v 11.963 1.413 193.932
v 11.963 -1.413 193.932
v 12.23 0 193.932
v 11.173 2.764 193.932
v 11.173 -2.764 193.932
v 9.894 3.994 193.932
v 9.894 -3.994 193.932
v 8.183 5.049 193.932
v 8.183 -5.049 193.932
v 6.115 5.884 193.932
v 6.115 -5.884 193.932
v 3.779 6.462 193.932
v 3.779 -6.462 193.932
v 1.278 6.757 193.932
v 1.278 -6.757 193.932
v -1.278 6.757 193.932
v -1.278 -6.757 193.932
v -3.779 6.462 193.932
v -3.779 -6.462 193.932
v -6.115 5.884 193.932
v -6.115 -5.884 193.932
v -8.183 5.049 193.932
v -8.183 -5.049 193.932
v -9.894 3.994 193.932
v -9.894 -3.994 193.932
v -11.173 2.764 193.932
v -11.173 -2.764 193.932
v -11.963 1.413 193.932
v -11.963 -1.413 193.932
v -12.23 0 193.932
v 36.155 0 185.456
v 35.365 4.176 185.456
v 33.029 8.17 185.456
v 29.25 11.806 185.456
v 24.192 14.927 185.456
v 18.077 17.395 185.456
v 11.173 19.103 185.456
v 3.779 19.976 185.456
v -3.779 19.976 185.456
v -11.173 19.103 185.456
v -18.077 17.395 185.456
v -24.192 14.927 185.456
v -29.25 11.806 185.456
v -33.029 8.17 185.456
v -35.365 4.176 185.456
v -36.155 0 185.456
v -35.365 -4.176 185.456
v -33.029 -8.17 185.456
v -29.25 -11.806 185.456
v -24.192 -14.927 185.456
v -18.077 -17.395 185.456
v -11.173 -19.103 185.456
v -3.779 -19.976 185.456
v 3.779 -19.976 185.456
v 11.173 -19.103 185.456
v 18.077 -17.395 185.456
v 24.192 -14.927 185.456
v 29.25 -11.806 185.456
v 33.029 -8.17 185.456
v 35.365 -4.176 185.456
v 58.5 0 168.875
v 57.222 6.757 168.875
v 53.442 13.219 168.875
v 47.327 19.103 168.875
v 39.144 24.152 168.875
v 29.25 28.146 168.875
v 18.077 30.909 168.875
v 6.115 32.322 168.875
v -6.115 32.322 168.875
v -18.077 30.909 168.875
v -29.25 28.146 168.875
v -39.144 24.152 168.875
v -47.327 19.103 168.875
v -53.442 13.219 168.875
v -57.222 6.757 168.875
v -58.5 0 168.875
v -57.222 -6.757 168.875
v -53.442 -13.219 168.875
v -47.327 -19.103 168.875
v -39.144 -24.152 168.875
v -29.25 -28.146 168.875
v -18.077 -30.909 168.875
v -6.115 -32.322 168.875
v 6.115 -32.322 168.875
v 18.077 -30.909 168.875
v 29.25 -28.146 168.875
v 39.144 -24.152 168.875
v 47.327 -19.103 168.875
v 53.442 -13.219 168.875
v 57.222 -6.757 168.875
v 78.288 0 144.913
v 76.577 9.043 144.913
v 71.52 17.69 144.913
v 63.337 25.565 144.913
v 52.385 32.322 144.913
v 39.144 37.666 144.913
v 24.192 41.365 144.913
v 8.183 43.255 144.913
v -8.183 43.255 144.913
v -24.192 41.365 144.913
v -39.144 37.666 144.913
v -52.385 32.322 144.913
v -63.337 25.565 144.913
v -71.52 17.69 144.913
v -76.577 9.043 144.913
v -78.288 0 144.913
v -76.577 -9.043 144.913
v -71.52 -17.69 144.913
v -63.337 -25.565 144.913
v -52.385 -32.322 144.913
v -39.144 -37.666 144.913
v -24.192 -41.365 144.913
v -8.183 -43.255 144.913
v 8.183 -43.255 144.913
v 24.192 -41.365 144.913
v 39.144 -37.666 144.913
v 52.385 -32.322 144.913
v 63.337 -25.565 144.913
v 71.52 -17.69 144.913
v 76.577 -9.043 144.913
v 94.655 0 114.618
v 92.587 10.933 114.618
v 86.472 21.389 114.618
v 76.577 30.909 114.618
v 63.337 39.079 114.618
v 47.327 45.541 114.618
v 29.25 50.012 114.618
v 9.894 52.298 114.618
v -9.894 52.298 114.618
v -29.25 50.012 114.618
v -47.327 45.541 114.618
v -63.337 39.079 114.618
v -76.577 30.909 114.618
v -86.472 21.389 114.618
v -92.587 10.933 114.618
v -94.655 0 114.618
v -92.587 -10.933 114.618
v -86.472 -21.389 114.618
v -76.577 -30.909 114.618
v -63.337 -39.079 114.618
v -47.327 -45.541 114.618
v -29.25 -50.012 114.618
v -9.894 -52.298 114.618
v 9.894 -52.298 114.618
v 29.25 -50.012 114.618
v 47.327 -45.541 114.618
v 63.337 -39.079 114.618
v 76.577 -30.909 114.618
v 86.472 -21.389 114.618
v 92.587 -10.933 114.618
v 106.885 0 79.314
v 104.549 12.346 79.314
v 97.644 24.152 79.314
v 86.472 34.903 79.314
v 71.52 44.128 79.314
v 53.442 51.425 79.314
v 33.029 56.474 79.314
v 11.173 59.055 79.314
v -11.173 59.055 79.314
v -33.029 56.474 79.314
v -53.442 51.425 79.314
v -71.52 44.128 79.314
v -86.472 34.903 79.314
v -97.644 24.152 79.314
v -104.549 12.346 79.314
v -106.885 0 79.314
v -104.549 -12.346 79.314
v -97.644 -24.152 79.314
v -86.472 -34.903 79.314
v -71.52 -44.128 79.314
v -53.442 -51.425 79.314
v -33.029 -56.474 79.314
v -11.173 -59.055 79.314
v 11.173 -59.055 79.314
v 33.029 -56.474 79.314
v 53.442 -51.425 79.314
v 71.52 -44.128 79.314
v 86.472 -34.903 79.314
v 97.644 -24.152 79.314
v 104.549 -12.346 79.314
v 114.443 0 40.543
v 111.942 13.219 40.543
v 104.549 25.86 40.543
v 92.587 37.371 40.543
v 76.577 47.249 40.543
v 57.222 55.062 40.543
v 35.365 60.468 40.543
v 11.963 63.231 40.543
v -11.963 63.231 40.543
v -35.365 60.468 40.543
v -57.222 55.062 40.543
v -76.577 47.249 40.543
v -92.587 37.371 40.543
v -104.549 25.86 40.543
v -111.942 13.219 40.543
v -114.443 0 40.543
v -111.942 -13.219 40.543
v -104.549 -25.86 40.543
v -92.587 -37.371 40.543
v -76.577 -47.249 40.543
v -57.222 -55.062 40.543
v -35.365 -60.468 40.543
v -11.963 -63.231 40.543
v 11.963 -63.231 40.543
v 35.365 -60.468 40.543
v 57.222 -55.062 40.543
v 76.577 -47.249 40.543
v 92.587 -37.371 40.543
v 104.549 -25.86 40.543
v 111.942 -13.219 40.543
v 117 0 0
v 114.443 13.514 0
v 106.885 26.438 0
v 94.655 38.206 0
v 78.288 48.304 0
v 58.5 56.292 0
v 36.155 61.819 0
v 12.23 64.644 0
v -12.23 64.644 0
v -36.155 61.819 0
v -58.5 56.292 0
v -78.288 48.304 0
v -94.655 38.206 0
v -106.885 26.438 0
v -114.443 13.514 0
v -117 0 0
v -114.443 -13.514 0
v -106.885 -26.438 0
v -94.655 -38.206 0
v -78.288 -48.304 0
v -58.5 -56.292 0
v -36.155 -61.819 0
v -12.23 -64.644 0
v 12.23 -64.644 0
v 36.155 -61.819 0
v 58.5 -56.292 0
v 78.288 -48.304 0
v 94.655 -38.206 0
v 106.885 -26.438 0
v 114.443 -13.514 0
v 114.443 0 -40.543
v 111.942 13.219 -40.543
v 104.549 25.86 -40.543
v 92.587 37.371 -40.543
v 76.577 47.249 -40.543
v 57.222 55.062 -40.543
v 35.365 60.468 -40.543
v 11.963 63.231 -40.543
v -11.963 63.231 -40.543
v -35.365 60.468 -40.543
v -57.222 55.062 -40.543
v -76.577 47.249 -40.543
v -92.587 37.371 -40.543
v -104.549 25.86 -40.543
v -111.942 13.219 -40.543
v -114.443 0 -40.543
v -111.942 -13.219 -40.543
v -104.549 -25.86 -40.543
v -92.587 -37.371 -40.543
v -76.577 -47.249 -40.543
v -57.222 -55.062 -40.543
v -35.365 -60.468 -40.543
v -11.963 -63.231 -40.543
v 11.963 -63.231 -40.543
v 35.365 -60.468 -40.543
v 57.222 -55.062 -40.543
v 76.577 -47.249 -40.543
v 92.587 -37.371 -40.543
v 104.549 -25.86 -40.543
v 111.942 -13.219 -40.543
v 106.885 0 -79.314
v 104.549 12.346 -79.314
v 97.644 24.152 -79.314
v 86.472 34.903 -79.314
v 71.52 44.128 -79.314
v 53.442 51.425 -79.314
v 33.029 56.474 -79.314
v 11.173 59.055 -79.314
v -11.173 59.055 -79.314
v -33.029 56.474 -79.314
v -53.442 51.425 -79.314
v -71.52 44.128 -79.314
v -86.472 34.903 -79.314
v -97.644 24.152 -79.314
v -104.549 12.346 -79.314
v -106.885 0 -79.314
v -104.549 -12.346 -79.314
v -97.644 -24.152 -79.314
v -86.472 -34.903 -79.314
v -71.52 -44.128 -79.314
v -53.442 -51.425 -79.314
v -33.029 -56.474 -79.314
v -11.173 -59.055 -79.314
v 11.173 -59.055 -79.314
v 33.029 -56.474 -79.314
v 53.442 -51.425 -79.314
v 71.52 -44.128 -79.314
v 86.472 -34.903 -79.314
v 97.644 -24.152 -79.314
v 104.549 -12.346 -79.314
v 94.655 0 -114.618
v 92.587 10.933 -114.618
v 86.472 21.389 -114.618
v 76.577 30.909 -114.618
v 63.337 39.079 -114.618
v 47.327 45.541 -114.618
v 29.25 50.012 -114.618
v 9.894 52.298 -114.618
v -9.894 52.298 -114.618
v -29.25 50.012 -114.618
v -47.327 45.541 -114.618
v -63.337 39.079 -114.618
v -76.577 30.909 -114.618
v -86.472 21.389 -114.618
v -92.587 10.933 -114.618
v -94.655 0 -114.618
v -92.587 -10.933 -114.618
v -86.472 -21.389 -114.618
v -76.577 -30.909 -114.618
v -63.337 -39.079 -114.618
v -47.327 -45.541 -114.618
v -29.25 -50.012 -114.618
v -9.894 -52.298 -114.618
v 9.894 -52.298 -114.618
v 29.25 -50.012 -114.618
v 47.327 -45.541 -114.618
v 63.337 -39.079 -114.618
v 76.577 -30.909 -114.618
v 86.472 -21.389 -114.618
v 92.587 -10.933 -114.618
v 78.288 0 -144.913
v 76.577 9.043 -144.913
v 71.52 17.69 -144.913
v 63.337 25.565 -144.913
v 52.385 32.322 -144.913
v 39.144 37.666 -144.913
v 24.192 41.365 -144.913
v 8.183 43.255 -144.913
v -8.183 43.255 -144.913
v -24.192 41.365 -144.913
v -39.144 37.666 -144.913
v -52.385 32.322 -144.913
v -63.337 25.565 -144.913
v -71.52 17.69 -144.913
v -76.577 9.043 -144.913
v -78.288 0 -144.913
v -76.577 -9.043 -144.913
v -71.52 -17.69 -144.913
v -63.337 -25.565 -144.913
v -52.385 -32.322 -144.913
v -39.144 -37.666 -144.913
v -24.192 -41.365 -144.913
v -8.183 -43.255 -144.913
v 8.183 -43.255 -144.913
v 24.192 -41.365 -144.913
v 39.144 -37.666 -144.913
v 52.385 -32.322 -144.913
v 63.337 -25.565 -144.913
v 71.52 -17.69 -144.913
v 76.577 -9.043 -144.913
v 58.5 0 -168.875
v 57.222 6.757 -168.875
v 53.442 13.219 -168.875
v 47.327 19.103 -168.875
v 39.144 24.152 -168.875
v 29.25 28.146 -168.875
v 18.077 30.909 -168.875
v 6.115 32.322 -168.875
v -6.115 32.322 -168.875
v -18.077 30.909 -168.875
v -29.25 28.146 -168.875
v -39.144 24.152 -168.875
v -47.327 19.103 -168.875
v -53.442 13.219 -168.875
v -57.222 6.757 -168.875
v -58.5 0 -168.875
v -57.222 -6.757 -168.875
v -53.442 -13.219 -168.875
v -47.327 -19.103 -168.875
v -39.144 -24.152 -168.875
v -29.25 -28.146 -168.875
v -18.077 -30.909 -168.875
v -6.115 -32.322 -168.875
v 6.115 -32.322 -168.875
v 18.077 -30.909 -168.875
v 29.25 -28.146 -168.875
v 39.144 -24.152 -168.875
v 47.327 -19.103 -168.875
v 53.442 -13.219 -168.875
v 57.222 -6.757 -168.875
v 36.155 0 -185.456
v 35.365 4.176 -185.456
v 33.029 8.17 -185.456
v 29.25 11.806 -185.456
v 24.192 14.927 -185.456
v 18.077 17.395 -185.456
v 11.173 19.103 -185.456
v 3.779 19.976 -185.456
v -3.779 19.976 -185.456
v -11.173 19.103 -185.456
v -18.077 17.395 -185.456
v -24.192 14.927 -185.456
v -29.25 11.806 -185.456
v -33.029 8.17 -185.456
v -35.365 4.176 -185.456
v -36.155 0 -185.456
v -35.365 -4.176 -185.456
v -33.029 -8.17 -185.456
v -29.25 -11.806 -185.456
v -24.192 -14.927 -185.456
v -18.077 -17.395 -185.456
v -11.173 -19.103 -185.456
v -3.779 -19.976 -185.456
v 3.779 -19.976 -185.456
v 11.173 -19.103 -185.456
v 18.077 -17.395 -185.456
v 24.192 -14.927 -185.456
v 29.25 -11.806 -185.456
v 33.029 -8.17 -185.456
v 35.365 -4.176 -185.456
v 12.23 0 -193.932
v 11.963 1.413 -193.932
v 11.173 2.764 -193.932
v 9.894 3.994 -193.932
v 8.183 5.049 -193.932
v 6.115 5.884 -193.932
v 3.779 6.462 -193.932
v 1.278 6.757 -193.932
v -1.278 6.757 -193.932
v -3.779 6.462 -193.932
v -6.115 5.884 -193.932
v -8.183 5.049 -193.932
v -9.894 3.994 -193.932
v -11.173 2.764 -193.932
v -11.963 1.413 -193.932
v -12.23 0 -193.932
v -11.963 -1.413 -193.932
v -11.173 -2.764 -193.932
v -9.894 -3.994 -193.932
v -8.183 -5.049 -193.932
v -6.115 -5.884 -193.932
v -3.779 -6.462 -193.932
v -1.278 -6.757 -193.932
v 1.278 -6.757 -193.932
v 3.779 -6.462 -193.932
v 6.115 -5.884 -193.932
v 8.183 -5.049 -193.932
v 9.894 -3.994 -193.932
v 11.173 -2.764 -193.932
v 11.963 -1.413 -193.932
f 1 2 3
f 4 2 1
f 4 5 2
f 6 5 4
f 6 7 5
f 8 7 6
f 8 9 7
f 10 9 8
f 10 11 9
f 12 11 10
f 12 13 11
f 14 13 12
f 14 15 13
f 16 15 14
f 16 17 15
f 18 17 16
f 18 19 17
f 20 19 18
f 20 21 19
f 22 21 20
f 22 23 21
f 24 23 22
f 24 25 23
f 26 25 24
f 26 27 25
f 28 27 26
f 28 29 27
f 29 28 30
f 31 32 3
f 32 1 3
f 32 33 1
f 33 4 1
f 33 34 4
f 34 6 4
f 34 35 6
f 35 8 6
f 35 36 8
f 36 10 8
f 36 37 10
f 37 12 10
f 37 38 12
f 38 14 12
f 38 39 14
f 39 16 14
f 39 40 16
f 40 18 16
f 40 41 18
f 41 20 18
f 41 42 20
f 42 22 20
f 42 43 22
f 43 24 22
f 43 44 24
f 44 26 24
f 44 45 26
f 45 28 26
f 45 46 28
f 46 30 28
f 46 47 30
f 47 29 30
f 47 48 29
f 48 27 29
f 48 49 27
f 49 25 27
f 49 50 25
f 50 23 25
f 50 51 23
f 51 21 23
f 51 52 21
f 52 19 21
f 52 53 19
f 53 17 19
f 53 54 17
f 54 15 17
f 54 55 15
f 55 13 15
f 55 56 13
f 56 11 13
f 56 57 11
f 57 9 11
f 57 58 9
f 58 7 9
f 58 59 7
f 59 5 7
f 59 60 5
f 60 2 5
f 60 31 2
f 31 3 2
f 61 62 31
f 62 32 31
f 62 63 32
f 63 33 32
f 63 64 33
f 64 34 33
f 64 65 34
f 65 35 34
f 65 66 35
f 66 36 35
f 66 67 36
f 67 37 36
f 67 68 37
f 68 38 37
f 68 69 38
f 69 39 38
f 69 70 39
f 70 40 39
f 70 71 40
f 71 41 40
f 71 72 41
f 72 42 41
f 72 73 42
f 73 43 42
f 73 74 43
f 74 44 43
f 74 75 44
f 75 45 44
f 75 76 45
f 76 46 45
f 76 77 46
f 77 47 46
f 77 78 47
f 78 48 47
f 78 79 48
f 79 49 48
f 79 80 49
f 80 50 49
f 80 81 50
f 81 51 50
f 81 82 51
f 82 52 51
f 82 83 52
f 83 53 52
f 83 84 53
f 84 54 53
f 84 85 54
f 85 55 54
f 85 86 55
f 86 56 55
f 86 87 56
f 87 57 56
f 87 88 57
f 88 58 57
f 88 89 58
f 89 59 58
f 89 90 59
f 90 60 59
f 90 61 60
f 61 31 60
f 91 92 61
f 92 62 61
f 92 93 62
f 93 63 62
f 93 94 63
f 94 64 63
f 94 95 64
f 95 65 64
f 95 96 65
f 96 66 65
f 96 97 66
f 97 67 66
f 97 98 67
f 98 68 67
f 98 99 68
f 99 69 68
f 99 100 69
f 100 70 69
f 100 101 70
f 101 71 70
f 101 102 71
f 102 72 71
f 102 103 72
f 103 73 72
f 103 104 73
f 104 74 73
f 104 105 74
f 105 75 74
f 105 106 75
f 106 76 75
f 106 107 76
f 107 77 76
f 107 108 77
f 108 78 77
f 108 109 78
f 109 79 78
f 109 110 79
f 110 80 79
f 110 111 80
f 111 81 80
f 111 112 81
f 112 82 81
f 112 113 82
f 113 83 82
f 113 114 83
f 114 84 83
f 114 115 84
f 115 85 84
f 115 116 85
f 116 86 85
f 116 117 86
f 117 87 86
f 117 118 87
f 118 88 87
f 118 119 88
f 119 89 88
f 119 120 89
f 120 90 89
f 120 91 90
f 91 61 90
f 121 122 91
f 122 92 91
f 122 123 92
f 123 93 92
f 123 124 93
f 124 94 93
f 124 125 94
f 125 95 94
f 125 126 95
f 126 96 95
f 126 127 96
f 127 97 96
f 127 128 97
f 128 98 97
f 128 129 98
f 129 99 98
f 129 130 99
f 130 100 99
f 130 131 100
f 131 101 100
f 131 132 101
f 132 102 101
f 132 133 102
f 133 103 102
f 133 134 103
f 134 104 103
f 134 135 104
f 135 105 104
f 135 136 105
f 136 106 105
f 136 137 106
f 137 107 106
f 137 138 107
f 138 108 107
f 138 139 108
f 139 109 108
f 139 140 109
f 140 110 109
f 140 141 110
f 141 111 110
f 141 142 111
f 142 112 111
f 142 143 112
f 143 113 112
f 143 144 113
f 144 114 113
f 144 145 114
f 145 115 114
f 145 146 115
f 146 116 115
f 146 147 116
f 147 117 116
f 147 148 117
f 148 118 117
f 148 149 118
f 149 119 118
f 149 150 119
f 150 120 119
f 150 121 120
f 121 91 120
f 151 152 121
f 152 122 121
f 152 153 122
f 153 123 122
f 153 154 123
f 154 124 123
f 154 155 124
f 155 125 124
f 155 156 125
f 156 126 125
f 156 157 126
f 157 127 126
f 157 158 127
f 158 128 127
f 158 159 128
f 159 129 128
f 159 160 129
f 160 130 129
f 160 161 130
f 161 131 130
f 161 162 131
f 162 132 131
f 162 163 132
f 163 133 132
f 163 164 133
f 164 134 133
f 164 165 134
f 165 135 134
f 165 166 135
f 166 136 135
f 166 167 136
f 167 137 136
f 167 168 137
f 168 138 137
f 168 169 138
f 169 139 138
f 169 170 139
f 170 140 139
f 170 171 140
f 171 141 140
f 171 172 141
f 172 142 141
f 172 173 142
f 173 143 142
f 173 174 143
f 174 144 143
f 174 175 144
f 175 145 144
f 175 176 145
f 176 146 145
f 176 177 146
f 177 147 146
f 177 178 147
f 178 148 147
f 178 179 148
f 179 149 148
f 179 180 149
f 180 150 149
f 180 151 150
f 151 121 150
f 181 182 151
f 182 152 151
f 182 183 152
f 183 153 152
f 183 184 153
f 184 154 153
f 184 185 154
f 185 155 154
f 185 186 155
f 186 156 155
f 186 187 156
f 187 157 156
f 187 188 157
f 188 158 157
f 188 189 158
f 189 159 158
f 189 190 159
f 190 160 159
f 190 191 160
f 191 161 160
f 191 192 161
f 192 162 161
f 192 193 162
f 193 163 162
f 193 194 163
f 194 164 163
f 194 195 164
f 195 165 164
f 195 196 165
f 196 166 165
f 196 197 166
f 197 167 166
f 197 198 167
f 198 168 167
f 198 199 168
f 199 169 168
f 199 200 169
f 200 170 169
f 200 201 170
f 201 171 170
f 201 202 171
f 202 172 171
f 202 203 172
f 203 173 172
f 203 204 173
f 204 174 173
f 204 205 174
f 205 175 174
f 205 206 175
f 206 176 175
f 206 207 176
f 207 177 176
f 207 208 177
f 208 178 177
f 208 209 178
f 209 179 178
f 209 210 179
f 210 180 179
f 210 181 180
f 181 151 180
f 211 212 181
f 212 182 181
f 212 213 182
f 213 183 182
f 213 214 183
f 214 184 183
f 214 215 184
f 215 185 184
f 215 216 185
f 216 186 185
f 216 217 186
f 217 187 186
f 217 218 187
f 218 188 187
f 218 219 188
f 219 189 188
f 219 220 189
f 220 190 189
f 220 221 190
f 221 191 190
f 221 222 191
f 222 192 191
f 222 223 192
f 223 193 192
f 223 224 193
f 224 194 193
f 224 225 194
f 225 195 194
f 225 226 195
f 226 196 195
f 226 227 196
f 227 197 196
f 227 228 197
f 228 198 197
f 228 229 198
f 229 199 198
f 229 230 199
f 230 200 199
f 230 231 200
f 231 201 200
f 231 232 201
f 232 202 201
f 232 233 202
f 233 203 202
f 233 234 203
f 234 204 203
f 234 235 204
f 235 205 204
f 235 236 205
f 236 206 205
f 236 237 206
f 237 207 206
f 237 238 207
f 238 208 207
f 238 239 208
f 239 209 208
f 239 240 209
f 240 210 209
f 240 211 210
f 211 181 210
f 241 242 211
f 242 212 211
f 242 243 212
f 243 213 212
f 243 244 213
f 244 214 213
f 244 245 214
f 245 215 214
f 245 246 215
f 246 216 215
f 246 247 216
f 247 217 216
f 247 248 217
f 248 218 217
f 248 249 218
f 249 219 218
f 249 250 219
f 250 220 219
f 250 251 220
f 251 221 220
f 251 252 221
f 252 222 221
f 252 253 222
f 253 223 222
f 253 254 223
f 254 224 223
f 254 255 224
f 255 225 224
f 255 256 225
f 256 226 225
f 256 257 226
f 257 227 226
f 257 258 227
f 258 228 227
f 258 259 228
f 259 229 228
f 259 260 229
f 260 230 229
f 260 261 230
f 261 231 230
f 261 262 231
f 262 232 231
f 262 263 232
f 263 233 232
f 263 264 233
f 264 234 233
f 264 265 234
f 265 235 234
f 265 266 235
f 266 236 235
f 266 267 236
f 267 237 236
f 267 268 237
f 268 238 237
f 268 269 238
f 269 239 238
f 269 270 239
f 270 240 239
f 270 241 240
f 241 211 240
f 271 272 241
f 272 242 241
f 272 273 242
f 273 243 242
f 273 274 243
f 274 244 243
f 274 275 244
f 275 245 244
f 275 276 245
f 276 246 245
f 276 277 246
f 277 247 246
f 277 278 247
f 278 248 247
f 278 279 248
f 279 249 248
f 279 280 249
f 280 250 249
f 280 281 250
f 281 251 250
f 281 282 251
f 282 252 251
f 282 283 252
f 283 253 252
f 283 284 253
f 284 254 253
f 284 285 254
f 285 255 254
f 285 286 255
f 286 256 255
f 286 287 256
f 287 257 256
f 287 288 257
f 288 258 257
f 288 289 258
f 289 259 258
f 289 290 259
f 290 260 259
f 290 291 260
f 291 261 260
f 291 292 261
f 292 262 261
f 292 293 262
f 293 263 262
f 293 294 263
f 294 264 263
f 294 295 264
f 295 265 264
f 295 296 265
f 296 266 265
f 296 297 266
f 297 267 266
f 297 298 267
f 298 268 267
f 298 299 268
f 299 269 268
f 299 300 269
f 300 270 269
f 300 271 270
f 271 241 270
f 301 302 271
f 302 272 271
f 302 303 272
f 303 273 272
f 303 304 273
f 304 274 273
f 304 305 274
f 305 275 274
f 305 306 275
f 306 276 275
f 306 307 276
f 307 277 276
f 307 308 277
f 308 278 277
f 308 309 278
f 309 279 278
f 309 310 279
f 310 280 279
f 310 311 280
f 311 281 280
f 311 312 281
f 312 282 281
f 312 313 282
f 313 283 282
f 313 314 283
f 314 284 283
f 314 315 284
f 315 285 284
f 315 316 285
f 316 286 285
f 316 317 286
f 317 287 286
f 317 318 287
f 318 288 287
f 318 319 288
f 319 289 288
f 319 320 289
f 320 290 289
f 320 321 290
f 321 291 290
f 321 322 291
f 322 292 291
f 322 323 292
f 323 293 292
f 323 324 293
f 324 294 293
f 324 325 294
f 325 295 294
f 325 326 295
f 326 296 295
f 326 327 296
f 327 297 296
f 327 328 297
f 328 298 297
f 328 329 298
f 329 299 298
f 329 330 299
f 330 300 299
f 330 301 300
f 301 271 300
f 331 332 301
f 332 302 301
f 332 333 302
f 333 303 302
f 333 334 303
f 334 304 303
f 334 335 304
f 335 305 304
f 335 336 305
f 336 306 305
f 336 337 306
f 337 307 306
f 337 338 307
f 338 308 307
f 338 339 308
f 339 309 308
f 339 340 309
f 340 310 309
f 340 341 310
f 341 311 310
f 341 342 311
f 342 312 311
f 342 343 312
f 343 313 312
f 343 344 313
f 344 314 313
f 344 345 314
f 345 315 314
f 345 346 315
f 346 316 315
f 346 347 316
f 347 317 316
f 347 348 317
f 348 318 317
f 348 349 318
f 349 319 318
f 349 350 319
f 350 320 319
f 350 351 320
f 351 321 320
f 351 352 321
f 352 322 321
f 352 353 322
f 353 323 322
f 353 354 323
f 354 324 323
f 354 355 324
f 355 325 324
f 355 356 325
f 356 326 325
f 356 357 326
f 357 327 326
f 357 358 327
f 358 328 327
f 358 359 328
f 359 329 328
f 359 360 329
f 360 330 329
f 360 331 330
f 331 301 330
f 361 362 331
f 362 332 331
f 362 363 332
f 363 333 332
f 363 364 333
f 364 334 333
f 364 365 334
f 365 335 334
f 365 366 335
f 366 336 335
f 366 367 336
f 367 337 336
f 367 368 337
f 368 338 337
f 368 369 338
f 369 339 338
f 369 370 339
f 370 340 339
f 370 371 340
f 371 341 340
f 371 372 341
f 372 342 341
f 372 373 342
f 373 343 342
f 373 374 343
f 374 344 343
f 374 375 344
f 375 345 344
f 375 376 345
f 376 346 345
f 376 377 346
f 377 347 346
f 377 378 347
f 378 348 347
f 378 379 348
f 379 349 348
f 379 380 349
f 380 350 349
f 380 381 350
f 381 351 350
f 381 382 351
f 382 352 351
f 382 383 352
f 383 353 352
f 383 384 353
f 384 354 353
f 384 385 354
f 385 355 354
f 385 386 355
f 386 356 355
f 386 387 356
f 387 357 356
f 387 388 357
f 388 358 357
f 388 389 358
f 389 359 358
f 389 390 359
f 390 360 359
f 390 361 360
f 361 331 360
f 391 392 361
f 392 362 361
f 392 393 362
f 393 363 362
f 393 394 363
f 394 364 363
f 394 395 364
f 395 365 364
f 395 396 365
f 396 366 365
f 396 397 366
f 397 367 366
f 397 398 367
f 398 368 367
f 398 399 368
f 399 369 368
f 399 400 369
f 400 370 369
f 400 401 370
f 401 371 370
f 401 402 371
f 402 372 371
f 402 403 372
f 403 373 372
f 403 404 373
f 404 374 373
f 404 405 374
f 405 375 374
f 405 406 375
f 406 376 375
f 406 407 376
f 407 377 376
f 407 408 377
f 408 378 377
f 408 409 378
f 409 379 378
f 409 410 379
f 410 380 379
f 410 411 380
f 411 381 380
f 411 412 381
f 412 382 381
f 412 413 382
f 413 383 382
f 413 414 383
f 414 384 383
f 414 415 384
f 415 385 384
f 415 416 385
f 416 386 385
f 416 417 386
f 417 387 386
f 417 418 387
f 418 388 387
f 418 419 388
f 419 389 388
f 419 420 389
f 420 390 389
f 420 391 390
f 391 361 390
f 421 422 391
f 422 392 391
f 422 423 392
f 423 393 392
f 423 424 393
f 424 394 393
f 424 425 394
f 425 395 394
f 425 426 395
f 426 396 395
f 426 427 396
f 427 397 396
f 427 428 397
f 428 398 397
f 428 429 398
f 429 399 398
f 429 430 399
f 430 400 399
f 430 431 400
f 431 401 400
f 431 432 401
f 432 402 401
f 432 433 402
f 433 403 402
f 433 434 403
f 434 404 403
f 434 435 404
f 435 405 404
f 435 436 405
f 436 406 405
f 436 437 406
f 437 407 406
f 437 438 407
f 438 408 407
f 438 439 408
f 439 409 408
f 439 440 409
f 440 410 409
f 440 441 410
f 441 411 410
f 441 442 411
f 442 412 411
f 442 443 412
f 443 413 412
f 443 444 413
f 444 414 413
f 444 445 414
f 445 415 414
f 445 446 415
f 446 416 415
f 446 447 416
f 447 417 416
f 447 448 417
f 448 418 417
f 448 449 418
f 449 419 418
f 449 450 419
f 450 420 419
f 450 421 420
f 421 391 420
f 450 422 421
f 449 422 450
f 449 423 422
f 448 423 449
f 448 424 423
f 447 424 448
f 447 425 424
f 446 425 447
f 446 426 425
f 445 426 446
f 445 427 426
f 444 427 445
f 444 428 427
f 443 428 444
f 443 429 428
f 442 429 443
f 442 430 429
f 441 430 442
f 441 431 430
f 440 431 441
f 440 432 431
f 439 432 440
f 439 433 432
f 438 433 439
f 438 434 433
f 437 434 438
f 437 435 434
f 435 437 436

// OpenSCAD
// Generated by SolidPython 1.0.1 on 2020-07-29 00:46:48


scale(v = [9, 5, 15]) {
	sphere(r = 13);
}
/***********************************************
*********      SolidPython code:      **********
************************************************
 
# import packages: SolidPython
from solid import *
from solid.utils import *
from itertools import chain, combinations, permutations


class Resize:

    def __init__(self, scad_file):
        self.scad_file = scad_file
        #self.scad_file = import_scad(scad_file)
        # cone/cylinder param:
        self.r1 = 0
        self.r2 = 0
        self.h = 0
        # rectangular prism param:
        self.w = 0
        self.l = 0
        # ellipse param:
        self.r = 0

    # import OpenScad code (file name corresponds to shape)


    # classify shape + parameters
    def assign(self, param1, param2, param3):
        if self.scad_file == 'cone.scad':
            self.r1 = param1
            self.r2 = param2
            self.h = param3
        elif self.scad_file == 'cylinder.scad':
            self.r1 = param1
            self.r2 = param2
            self.h = param3
        elif self.scad_file == 'rectangularPrism.scad':
            self.h = param1
            self.l = param2
            self.w = param3
        else:
            self.r = param1
            self.h = param2

    # resize parameters
    def iterate(self):
        x = range(3, 20, 2)
        i = 1
        if self.scad_file == 'cone.scad':
            tempList = list(permutations(x, 2))
            for temp in tempList:
                param1 = temp[0]
                param2 = temp[1]
                filepath = 'produced_scad_files/' + 'cone' + str(param1) + '_' + str(param2) + '_' + '.scad'
                scad_render_to_file(cylinder(h=param1, r1=param2, r2=0), filepath)

        elif self.scad_file == 'cylinder.scad':
            tempList = list(permutations(x, 3))
            for temp in tempList:
                param1 = temp[0]
                param2 = temp[1]
                filepath = 'produced_scad_files/' + 'cylinder' + str(param1) + '_' + str(param2) + '_' + '.scad'
                scad_render_to_file(cylinder(h=param1, r1=param2, r2=param2), filepath)

        elif self.scad_file == 'rectangularPrism.scad':
            tempList = list(permutations(x, 3))
            for temp in tempList:
                param1 = temp[0]
                param2 = temp[1]
                param3 = temp[2]
                filepath = 'produced_scad_files/' + 'rectangularPrism' + str(param1) + '_' + str(param2) + '_' + str(
                    param3) + '.scad'
                scad_render_to_file(cube(size=(param1, param2, param3)), filepath)

        elif self.scad_file == 'ellipse.scad':
            tempList = list(permutations(x, 4))
            for temp in tempList:
                param1 = temp[0]
                param2 = temp[1]
                param3 = temp[2]
                param4 = temp[3]
                filepath = 'produced_scad_files/' + 'ellipse' + str(param1) + '_' + str(param2) + '_' + str(param3) + '_' + str(param4) + '.scad'
                scad_render_to_file(scale([param1, param2, param3])(sphere(r=param4)), filepath)

    def render_to_scadfile(self):
        scad_render_to_file(scad, 'example.scad') 
 
************************************************/
